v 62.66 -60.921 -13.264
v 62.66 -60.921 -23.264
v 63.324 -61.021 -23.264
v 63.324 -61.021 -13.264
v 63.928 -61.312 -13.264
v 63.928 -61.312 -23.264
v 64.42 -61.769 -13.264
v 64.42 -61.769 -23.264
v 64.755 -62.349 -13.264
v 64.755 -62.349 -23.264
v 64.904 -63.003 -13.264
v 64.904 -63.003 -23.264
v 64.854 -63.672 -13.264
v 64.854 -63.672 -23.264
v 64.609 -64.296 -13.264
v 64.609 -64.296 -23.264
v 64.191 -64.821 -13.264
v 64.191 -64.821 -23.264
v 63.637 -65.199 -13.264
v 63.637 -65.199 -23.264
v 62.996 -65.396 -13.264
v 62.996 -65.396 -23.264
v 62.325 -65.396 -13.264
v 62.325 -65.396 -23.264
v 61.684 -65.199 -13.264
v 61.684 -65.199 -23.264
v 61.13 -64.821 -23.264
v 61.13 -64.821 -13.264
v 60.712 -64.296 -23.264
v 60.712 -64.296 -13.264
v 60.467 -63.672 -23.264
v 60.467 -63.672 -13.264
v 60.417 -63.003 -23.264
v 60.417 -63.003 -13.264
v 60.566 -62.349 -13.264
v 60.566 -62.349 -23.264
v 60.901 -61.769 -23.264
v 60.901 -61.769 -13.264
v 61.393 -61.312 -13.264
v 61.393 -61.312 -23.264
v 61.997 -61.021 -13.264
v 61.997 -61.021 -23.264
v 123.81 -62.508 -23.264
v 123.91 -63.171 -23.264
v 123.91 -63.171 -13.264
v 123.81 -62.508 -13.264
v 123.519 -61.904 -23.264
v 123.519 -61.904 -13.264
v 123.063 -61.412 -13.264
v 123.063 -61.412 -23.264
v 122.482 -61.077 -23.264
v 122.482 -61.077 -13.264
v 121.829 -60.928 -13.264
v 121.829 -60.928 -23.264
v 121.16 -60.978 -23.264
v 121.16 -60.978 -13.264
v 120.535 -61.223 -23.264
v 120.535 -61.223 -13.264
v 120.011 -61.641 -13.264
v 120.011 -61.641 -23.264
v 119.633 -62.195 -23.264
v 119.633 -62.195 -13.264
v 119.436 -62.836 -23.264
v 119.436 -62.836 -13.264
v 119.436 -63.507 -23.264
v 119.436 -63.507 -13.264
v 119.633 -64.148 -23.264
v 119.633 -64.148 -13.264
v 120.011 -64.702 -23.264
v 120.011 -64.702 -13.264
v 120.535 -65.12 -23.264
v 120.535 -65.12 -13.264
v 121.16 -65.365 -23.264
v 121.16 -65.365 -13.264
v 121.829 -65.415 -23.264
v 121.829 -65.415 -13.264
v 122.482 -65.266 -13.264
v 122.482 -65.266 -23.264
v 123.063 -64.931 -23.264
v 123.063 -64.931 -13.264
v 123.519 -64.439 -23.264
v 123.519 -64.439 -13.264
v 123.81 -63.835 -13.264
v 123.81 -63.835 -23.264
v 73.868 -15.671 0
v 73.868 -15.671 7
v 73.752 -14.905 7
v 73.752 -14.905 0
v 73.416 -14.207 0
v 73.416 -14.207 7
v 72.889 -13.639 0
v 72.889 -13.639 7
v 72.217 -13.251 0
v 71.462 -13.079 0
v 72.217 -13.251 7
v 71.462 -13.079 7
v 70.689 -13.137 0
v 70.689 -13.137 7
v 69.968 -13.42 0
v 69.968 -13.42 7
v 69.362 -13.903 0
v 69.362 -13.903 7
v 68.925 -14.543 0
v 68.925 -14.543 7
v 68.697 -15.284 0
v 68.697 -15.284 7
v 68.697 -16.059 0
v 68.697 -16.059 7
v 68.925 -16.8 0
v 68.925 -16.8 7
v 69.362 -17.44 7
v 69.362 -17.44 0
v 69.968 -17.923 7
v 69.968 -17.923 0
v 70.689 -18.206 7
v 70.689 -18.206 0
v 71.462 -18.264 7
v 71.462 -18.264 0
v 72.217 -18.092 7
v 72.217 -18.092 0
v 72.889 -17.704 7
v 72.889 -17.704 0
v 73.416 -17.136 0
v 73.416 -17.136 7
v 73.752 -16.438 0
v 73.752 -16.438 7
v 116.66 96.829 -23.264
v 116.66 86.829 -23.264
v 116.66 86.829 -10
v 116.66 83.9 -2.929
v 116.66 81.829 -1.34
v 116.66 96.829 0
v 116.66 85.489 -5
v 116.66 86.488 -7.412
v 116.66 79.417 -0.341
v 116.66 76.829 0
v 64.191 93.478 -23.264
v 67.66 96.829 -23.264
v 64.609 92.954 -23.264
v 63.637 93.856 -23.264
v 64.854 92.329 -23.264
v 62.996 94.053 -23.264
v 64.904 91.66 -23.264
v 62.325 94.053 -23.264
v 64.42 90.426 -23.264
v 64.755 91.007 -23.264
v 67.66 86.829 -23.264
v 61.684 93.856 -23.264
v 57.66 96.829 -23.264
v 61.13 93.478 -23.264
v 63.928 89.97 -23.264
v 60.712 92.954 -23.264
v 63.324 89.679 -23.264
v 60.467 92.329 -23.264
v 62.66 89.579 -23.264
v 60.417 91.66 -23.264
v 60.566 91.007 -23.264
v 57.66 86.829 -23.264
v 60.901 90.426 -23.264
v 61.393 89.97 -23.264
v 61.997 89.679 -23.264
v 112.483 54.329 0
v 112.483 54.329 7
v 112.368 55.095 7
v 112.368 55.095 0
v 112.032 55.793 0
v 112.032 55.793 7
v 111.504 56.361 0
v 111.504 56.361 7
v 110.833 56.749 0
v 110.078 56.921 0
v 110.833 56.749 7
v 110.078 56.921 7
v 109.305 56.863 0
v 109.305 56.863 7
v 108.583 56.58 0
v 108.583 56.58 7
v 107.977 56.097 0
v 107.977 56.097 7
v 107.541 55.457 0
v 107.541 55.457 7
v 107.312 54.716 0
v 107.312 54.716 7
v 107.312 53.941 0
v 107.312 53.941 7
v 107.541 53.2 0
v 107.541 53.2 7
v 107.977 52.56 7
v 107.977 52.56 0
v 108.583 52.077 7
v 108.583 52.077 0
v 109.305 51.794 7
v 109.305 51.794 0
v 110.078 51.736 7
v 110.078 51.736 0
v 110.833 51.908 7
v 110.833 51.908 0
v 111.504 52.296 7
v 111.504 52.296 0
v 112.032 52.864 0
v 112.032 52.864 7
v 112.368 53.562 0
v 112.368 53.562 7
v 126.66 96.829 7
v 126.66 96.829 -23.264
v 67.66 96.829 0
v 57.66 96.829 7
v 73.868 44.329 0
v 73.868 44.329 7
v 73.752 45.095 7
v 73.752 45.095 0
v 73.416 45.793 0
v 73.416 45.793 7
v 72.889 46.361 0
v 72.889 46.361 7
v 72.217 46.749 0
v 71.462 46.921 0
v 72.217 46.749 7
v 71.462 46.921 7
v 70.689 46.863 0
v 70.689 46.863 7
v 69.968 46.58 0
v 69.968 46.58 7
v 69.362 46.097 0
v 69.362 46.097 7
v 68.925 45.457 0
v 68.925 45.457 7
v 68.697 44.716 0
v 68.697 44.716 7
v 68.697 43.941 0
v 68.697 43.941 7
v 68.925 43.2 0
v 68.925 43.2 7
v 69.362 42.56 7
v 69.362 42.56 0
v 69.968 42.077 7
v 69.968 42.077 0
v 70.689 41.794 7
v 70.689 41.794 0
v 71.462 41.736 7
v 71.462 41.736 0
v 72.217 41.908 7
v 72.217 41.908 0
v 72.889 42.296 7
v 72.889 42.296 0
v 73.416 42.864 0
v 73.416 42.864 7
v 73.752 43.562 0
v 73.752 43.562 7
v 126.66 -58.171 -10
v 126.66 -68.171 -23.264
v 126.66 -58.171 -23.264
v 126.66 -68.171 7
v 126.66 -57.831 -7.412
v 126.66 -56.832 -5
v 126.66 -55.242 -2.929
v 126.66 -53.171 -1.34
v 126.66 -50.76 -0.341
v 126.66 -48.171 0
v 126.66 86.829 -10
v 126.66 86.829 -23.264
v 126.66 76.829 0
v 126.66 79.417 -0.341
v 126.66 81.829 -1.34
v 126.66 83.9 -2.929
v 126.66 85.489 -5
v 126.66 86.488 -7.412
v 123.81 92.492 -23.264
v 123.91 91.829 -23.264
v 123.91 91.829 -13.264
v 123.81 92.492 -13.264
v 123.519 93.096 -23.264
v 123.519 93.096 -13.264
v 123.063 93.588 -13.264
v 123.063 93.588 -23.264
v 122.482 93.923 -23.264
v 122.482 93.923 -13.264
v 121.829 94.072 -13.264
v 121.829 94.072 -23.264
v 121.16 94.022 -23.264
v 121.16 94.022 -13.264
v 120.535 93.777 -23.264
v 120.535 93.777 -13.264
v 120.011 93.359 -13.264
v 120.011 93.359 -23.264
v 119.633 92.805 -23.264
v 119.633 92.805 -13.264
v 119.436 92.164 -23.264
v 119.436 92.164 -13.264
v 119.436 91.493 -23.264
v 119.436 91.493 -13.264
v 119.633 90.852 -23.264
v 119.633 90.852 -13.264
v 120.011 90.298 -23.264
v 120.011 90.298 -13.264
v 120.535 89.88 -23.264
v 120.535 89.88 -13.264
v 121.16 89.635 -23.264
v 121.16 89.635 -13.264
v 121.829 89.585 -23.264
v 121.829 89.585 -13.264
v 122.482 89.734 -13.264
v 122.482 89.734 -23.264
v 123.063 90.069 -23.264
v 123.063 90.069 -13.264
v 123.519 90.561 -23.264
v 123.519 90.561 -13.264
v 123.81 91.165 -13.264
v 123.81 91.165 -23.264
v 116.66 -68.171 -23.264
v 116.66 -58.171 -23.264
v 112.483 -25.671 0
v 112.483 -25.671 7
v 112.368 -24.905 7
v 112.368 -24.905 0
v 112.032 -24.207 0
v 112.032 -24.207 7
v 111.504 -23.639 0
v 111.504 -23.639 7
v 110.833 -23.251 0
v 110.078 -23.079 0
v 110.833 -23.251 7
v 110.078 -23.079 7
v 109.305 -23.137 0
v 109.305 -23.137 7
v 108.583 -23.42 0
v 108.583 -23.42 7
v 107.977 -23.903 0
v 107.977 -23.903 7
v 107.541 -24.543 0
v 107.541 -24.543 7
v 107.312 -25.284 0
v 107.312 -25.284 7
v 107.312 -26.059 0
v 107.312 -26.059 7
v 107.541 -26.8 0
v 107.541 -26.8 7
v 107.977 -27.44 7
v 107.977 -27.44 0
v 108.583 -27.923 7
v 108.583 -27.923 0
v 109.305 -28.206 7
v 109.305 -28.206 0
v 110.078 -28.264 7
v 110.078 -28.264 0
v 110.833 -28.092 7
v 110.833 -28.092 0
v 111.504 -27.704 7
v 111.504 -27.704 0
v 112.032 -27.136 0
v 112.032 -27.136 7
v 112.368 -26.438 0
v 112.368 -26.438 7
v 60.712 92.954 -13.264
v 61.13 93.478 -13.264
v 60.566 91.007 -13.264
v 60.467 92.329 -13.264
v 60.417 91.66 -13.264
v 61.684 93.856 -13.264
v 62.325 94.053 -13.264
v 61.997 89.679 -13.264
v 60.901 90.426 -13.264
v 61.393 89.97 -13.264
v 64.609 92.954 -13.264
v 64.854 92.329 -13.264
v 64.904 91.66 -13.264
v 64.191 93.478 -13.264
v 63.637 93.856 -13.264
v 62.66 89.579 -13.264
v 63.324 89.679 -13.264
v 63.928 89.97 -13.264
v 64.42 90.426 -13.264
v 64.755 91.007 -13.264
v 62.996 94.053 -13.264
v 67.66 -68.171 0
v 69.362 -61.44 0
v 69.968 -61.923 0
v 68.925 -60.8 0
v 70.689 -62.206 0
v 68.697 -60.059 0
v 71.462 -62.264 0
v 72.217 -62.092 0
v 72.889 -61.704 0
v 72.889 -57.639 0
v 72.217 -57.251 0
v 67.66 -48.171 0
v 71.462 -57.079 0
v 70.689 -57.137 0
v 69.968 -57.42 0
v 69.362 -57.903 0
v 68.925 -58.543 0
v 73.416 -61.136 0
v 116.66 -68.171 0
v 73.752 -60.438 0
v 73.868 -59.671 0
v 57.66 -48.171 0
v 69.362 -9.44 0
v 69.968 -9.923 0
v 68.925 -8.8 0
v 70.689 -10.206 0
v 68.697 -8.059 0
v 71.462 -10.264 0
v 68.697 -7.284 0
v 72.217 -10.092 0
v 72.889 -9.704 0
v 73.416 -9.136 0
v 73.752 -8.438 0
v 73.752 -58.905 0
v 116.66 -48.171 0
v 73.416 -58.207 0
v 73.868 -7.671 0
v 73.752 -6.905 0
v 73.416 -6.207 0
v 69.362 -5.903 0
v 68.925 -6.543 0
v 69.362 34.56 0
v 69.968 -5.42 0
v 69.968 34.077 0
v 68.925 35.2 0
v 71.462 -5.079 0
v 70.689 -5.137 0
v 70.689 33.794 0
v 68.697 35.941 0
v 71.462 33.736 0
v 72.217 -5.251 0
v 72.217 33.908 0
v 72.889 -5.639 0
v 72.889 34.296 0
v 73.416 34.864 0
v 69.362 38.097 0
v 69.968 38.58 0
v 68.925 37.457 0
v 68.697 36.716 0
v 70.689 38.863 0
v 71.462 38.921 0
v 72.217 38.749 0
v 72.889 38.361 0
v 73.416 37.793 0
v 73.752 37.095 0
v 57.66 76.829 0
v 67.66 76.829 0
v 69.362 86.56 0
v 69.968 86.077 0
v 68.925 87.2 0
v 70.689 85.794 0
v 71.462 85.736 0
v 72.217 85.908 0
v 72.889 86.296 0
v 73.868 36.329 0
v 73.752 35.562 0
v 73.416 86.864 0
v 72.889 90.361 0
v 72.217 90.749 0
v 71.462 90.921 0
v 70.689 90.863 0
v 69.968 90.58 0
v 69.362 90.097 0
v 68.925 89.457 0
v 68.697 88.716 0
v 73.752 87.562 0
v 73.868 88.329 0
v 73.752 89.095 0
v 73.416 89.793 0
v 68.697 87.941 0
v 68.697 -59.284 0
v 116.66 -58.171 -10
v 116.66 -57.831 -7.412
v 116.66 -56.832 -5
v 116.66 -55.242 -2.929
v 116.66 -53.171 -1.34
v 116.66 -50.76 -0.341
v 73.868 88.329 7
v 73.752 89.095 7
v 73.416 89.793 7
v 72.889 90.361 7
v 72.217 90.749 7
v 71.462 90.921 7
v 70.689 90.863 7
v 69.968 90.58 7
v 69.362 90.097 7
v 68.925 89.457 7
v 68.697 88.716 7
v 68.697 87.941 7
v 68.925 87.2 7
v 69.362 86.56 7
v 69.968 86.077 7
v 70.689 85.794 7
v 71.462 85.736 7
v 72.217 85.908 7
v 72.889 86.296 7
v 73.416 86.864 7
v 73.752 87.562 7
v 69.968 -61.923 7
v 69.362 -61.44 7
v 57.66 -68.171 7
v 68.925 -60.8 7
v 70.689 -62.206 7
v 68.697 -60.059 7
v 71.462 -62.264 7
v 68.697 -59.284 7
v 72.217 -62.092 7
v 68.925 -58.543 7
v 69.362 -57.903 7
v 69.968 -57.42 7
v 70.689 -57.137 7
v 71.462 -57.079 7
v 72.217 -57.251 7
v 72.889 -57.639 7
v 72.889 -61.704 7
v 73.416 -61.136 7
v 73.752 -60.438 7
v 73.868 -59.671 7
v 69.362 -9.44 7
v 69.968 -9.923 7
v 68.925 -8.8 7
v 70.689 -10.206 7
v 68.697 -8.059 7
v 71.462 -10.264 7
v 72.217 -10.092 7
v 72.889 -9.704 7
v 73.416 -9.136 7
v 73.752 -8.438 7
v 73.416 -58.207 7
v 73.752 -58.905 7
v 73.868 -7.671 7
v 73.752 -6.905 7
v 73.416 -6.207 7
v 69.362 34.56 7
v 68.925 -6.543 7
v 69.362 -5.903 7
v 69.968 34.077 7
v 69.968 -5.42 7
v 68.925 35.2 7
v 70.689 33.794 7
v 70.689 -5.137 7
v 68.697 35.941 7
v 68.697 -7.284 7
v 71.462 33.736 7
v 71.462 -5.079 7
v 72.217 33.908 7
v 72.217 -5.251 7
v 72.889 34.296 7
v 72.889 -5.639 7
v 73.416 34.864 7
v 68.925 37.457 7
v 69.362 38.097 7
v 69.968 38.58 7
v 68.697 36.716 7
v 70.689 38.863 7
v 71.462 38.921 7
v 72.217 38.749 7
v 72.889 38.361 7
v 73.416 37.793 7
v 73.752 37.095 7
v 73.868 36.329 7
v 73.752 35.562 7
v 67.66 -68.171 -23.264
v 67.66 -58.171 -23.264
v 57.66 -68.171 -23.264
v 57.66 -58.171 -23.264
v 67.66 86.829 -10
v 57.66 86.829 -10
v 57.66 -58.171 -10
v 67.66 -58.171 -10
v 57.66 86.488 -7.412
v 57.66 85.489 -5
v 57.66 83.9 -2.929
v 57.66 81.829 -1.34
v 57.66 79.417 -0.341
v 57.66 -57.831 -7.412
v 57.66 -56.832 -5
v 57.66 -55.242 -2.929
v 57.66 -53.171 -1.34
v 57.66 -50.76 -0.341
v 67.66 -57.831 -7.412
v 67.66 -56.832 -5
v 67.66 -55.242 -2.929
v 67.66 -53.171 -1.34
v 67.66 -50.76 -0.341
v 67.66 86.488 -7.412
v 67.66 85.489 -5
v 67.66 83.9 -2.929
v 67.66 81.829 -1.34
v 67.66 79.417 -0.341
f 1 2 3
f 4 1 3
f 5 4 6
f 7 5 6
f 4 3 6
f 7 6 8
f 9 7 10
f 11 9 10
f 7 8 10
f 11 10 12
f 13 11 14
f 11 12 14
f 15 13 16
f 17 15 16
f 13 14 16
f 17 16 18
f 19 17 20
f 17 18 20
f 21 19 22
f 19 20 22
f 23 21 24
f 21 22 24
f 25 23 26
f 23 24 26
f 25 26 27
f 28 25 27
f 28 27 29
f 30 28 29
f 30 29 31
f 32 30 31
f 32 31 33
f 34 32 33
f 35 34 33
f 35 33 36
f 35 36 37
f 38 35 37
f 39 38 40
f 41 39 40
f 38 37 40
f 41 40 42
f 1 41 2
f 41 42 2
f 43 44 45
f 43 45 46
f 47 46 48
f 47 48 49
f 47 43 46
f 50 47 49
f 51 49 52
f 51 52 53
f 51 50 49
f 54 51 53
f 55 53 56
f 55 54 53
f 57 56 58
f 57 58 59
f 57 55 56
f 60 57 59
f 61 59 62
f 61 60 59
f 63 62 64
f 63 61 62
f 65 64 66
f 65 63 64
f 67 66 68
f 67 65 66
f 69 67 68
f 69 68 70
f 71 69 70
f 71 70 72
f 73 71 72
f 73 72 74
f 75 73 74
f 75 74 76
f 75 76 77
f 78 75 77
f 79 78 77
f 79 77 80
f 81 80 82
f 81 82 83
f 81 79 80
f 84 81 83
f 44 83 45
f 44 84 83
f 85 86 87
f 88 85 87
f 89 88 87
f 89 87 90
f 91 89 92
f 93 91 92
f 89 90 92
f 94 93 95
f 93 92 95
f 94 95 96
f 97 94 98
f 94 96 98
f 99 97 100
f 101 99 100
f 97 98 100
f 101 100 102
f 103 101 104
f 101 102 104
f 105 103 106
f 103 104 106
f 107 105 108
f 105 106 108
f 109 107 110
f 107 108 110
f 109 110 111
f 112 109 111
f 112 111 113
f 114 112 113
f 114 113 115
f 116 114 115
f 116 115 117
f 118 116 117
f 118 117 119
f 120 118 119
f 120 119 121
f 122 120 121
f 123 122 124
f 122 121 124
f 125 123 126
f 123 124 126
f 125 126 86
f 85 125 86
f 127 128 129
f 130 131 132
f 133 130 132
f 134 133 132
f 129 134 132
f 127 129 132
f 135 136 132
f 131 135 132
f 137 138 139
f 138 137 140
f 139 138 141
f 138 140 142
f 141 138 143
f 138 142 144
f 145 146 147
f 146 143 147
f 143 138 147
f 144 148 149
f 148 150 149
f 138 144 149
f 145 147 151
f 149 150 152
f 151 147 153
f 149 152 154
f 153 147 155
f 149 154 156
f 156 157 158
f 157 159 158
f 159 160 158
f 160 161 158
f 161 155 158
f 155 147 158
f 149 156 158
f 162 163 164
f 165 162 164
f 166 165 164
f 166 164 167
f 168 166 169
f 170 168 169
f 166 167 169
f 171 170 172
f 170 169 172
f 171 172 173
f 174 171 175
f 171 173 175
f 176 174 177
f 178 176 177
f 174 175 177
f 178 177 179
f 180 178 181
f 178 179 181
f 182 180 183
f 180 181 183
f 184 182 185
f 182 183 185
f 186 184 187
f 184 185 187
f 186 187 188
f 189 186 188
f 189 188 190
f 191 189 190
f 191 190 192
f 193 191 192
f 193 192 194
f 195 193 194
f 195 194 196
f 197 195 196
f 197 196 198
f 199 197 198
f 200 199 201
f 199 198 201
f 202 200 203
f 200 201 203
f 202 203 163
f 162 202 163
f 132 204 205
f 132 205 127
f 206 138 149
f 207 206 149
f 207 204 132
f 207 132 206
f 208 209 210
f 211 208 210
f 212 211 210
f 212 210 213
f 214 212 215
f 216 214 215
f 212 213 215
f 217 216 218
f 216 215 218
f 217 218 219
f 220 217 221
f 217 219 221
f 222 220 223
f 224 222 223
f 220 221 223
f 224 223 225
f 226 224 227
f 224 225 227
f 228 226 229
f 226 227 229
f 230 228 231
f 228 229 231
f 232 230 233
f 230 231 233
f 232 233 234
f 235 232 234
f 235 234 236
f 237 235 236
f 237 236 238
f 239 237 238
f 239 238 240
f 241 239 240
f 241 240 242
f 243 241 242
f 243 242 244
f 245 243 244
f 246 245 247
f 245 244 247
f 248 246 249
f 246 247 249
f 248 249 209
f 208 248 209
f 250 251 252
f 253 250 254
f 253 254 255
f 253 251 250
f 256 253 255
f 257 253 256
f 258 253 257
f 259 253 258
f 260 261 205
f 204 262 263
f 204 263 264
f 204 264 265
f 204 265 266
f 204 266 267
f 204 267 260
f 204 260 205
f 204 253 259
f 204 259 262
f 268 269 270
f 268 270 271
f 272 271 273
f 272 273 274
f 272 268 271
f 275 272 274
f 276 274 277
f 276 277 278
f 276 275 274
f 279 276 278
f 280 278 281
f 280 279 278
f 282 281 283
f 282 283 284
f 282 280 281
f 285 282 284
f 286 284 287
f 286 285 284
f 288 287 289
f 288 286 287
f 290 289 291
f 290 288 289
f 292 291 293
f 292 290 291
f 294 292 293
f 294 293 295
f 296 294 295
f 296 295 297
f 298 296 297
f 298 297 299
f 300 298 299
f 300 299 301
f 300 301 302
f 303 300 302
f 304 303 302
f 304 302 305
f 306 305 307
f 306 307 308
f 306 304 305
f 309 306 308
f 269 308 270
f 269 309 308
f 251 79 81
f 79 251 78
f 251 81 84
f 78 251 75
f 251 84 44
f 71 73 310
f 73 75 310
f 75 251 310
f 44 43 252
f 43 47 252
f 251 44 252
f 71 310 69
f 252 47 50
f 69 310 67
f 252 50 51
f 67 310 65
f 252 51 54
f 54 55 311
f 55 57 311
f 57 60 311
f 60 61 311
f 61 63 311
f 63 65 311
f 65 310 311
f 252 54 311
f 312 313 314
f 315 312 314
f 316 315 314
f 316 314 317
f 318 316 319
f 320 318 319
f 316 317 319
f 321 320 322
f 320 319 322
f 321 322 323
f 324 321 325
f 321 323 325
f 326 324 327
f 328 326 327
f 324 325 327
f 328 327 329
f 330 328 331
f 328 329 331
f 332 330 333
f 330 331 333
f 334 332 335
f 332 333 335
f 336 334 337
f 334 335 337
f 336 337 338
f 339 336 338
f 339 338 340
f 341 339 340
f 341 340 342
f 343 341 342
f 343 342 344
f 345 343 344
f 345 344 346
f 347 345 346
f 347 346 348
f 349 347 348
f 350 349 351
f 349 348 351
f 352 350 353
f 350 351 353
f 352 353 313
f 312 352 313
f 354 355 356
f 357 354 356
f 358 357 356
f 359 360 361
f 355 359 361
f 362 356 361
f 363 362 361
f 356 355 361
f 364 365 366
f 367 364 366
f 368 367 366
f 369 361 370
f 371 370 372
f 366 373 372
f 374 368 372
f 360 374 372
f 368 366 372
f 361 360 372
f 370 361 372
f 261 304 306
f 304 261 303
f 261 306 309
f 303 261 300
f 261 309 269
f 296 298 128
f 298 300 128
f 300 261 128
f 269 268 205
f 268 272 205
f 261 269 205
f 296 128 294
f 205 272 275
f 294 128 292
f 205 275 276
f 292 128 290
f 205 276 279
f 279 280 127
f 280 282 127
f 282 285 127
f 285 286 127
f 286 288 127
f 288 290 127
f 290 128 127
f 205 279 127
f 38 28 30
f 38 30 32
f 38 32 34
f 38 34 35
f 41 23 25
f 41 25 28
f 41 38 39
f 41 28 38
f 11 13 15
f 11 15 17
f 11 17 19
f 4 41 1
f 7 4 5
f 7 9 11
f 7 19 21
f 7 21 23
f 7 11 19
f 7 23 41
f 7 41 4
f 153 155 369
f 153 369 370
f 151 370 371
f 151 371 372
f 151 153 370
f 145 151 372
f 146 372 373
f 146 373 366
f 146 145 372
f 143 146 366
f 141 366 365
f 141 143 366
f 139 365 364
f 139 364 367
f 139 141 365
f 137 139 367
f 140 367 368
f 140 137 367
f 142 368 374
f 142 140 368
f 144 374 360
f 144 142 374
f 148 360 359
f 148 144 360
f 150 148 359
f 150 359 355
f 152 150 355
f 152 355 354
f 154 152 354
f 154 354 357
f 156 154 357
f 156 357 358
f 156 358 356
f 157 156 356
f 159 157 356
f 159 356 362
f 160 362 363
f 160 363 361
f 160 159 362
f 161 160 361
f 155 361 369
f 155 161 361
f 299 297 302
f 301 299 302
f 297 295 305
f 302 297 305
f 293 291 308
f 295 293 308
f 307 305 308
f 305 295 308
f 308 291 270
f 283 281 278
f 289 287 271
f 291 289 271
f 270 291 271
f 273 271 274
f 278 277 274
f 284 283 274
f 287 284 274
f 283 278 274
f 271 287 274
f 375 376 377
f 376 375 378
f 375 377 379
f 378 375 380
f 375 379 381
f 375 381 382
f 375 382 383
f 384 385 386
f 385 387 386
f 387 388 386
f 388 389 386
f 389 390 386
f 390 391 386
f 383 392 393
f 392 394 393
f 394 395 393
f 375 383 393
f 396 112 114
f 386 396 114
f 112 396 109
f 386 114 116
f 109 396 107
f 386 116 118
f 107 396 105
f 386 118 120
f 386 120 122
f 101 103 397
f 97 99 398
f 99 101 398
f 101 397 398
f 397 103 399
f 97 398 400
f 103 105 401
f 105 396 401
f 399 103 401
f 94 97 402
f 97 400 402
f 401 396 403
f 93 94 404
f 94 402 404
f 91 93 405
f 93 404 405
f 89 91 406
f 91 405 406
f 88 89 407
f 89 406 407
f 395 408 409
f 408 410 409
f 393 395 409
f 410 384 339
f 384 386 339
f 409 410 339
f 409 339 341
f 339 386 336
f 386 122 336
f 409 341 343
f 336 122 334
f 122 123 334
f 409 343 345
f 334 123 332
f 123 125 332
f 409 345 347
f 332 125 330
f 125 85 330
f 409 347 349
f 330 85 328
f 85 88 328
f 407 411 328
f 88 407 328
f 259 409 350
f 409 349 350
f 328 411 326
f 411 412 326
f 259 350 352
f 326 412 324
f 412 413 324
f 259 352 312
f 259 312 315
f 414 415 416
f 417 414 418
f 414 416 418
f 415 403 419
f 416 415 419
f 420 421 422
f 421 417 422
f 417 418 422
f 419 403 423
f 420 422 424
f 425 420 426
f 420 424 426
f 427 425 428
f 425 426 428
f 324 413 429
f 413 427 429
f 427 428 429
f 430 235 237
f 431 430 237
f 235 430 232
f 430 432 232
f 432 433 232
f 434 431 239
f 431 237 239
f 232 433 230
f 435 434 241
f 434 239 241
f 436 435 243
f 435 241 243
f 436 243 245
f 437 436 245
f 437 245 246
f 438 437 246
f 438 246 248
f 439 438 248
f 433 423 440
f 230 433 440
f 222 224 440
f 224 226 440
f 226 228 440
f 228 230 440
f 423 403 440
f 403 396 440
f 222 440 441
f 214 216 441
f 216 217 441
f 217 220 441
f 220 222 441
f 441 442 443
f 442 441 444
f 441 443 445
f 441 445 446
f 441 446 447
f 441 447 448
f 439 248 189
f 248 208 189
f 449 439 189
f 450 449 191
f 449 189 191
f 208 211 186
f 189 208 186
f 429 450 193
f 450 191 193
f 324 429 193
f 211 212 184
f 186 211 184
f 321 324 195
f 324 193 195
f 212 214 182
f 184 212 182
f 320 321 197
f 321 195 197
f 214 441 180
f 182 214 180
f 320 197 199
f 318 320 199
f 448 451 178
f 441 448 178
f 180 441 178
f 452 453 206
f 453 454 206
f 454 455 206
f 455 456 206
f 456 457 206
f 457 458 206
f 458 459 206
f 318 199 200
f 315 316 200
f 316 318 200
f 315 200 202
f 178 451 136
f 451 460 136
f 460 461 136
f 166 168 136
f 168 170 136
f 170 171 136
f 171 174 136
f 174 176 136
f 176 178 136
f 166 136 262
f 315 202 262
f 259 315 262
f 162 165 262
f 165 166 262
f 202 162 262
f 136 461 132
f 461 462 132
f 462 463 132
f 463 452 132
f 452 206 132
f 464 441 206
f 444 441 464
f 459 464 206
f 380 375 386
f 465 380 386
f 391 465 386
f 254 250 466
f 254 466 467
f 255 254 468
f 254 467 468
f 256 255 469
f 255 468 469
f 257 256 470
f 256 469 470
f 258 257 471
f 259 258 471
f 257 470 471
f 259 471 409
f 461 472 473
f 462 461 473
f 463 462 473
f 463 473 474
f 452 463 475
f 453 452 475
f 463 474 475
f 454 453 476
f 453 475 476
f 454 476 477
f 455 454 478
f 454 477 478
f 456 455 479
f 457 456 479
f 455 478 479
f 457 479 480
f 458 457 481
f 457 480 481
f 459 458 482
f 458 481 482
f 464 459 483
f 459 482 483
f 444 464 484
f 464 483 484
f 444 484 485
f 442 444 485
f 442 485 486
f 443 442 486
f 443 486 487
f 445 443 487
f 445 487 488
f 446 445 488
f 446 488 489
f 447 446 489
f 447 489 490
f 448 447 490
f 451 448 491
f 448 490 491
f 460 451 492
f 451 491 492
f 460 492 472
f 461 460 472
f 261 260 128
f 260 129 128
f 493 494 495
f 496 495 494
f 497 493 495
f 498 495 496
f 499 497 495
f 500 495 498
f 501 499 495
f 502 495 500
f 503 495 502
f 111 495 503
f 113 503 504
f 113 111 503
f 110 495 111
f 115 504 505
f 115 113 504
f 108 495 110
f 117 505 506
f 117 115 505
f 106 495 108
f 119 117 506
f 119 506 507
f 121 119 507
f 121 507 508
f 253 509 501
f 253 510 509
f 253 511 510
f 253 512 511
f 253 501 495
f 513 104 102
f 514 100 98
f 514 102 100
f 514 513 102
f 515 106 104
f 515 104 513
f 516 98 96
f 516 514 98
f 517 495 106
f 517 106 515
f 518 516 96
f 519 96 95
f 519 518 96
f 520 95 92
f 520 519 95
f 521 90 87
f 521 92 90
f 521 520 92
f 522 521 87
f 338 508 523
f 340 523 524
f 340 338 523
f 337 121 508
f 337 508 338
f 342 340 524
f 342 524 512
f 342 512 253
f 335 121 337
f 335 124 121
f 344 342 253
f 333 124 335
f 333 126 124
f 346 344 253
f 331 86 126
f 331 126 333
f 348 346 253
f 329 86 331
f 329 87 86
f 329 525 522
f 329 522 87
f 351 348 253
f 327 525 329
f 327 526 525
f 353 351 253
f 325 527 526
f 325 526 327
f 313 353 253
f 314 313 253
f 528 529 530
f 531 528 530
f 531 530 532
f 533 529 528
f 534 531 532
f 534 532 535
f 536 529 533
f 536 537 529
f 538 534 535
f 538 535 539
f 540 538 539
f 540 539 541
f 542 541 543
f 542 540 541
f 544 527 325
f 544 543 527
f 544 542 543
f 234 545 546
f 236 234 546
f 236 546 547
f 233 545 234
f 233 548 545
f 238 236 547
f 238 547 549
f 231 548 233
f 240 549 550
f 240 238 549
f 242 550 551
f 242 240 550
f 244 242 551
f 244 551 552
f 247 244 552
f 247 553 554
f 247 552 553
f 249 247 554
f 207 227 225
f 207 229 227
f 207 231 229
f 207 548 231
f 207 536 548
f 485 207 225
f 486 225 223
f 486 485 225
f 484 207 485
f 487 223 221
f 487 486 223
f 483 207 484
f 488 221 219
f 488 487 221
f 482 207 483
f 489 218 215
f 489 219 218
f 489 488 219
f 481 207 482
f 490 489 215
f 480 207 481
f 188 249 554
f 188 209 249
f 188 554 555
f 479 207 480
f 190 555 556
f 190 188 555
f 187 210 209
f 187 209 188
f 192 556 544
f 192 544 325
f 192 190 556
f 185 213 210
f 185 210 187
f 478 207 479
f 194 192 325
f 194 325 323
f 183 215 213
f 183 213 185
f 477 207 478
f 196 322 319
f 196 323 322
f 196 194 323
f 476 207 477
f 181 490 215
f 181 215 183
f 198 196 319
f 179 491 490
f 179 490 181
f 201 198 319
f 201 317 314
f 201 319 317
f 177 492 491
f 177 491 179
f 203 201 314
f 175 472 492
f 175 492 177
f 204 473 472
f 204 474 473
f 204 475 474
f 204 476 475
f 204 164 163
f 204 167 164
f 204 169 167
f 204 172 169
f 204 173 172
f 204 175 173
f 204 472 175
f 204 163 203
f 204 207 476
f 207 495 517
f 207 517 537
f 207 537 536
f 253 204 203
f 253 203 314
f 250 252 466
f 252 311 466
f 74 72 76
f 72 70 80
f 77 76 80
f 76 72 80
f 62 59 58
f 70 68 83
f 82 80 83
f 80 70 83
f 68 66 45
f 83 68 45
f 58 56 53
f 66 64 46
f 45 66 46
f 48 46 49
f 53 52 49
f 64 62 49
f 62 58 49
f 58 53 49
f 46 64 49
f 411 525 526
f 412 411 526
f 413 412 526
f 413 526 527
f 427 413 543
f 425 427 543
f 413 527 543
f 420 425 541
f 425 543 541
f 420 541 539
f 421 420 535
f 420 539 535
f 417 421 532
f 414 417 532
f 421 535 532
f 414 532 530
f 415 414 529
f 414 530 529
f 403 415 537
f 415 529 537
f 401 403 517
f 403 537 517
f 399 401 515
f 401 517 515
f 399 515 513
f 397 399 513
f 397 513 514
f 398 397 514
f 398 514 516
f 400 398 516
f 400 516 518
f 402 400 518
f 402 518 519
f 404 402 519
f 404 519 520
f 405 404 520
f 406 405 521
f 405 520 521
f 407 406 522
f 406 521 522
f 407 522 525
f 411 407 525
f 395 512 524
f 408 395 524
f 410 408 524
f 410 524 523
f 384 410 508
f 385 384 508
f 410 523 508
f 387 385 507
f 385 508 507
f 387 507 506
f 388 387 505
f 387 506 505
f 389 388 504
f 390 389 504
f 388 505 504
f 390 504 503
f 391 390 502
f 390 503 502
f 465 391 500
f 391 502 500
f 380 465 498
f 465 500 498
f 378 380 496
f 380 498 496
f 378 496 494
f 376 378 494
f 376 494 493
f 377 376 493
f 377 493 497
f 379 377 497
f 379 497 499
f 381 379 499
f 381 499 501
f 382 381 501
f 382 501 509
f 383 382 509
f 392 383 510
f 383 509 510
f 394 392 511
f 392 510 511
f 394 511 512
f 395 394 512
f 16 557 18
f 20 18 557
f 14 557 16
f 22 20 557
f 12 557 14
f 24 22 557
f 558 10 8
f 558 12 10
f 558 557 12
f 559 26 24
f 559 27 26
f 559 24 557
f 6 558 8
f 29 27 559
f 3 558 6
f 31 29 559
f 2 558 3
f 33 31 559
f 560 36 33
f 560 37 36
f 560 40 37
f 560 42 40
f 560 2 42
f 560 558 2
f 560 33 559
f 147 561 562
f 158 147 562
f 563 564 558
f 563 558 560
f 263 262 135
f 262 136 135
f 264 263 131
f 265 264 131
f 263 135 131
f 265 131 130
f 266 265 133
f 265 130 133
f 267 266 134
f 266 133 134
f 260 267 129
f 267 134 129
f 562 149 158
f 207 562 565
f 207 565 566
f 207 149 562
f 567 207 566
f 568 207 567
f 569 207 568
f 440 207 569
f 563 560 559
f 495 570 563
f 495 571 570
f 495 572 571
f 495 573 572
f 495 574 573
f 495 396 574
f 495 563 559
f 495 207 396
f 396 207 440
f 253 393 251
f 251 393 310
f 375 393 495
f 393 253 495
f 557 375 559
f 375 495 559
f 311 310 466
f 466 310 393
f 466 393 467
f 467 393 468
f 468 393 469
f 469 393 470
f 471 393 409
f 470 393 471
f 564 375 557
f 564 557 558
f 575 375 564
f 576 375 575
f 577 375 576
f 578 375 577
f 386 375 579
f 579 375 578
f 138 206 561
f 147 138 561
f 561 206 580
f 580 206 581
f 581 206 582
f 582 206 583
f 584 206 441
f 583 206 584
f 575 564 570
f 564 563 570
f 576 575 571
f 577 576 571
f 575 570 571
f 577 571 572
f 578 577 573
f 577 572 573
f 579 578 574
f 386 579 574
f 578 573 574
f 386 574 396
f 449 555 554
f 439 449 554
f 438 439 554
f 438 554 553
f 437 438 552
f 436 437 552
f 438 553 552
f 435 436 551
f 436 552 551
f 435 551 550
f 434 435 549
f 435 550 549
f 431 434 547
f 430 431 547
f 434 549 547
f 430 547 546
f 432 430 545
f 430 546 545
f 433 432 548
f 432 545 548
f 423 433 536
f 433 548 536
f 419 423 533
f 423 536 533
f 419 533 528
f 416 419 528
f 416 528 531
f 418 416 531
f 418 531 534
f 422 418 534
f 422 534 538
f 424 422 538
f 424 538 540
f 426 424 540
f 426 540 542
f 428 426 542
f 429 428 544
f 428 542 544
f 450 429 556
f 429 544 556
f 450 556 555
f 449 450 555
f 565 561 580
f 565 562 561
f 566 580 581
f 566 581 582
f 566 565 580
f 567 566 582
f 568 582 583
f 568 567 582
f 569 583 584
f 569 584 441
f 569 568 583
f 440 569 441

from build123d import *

# Parameters (mm, degrees)
SKETCH1_W            = 69
SKETCH1_H            = 165
BOSS_EXTRUDE1_DEPTH  = 7
SKETCH3_R            = 2.6
CUT_EXTRUDE2_DEPTH   = 7
SKETCH2_R            = 2.6
CUT_EXTRUDE1_DEPTH   = 7
SKETCH5_W            = 10
SKETCH5_H            = 10
BOSS_EXTRUDE2_DEPTH  = 23.264128691
SKETCH6_R            = 2.25
CUT_EXTRUDE3_DEPTH   = 10
FILLET1_R            = 10
FILLET1_OF_MIRROR1_R = 10
MIRROR2_START        = 123.910418582
MIRROR2_DEPTH        = 2.75
MIRROR2_START_2      = 116.660418582
MIRROR2_2_DEPTH      = 2.7499999
MIRROR2_START_3      = 119.410418482
MIRROR2_3_DEPTH      = 4.5000001
MIRROR2_START_4      = -23.264128691
MIRROR2_4_OUTLINE_R  = 2.25
MIRROR2_4_DEPTH      = 10


with BuildPart() as part:
    # Sketch1 → Boss-Extrude1 (new body)
    with BuildSketch(Plane.XY):
        with Locations((92.160418582, 14.328579343)):
            Rectangle(SKETCH1_W, SKETCH1_H)
    extrude(amount=BOSS_EXTRUDE1_DEPTH)

    # Sketch3 → Cut-Extrude2 (cut)
    with BuildSketch(Plane.XY.offset(7)):
        with Locations((109.883329943, 54.328579343)):
            Circle(SKETCH3_R)
        with Locations((109.883329943, -25.671420657)):
            Circle(SKETCH3_R)
    extrude(amount=-CUT_EXTRUDE2_DEPTH, mode=Mode.SUBTRACT)

    # Sketch2 → Cut-Extrude1 (cut)
    with BuildSketch(Plane.XY.offset(7)):
        with Locations((71.267526747, -59.671420657)):
            Circle(SKETCH2_R)
        with Locations((71.267526747, -15.671420657)):
            Circle(SKETCH2_R)
        with Locations((71.267526747, -7.671420657)):
            Circle(SKETCH2_R)
        with Locations((71.267526747, 36.328579343)):
            Circle(SKETCH2_R)
        with Locations((71.267526747, 44.328579343)):
            Circle(SKETCH2_R)
        with Locations((71.267526747, 88.328579343)):
            Circle(SKETCH2_R)
    extrude(amount=-CUT_EXTRUDE1_DEPTH, mode=Mode.SUBTRACT)

    # Sketch5 → Boss-Extrude2 (add)
    with BuildSketch(Plane(origin=(0, 0, 0), x_dir=(-1, 0, 0), z_dir=(0, 0, -1))):
        with Locations((-62.660418582, -63.171420657)):
            Rectangle(SKETCH5_W, SKETCH5_H)
    boss_extrude2 = extrude(amount=BOSS_EXTRUDE2_DEPTH)

    # Sketch6 → Cut-Extrude3 (cut)
    with BuildSketch(Plane(origin=(0, 0, -23.264128691), x_dir=(-1, 0, 0), z_dir=(0, 0, -1))):
        with Locations(Location((-62.660418582, -63.171420657, 0), (0, 0, 90))):
            Circle(SKETCH6_R)
    cut_extrude3 = extrude(amount=-CUT_EXTRUDE3_DEPTH, mode=Mode.SUBTRACT)

    # Fillet1
    fillet1_edges = [part.edges().sort_by_distance(p)[0] for p in [
        (62.660418582, -58.171420657, 0),
    ]]
    fillet(fillet1_edges, radius=FILLET1_R)

    # Mirror1: Boss-Extrude2, Cut-Extrude3 across plane
    add(boss_extrude2.mirror(Plane(origin=(0, 14.328579343, 0), x_dir=(0, 0, 1), z_dir=(0, -1, 0))))
    add(cut_extrude3.mirror(Plane(origin=(0, 14.328579343, 0), x_dir=(0, 0, 1), z_dir=(0, -1, 0))), mode=Mode.SUBTRACT)

    # Fillet1 of Mirror1
    fillet1_of_mirror1_edges = [part.edges().sort_by_distance(p)[0] for p in [
        (62.660418582, 86.828579343, 0),
    ]]
    fillet(fillet1_of_mirror1_edges, radius=FILLET1_OF_MIRROR1_R)

    # Mirror2: read off the stored shape, not the designer's step
    # Mirror2 outline → Mirror2 (add)
    with BuildSketch(Plane.YZ.offset(MIRROR2_START)):
        with BuildLine():
            ThreePointArc((-58.171420657, -10), (-55.242488469, -2.928932188), (-48.171420657, 0))
            Line((-48.171420657, 0), (-68.171420657, 0))
            Line((-68.171420657, 0), (-68.171420657, -23.264128691))
            Line((-68.171420657, -23.264128691), (-58.171420657, -23.264128691))
            Line((-58.171420657, -23.264128691), (-58.171420657, -10))
        make_face()
        with BuildLine():
            Line((96.828579343, -23.264128691), (96.828579343, 0))
            Line((96.828579343, 0), (76.828579343, 0))
            ThreePointArc((76.828579343, 0), (83.899647155, -2.928932188), (86.828579343, -10))
            Line((86.828579343, -10), (86.828579343, -23.264128691))
            Line((86.828579343, -23.264128691), (96.828579343, -23.264128691))
        make_face()
    extrude(amount=MIRROR2_DEPTH)

    # Mirror2 2 outline → Mirror2 2 (add)
    with BuildSketch(Plane.YZ.offset(MIRROR2_START_2)):
        with BuildLine():
            ThreePointArc((-58.171420657, -10), (-55.242488469, -2.928932188), (-48.171420657, 0))
            Line((-48.171420657, 0), (-68.171420657, 0))
            Line((-68.171420657, 0), (-68.171420657, -23.264128691))
            Line((-68.171420657, -23.264128691), (-58.171420657, -23.264128691))
            Line((-58.171420657, -23.264128691), (-58.171420657, -10))
        make_face()
        with BuildLine():
            Line((96.828579343, -23.264128691), (96.828579343, 0))
            Line((96.828579343, 0), (76.828579343, 0))
            ThreePointArc((76.828579343, 0), (83.899647155, -2.928932188), (86.828579343, -10))
            Line((86.828579343, -10), (86.828579343, -23.264128691))
            Line((86.828579343, -23.264128691), (96.828579343, -23.264128691))
        make_face()
    extrude(amount=MIRROR2_2_DEPTH)

    # Mirror2 3 outline → Mirror2 3 (add)
    with BuildSketch(Plane.YZ.offset(MIRROR2_START_3)):
        with BuildLine():
            Line((-68.171420657, -23.264128691), (-58.171420657, -23.264128691))
            Line((-58.171420657, -23.264128691), (-58.171420657, -10))
            ThreePointArc((-58.171420657, -10), (-55.242488469, -2.928932188), (-48.171420657, 0))
            Line((-48.171420657, 0), (-68.171420657, 0))
            Line((-68.171420657, 0), (-68.171420657, -23.264128691))
        make_face()
        with BuildLine():
            Line((96.828579343, 0), (76.828579343, 0))
            ThreePointArc((76.828579343, 0), (83.899647155, -2.928932188), (86.828579343, -10))
            Line((86.828579343, -10), (86.828579343, -23.264128691))
            Line((86.828579343, -23.264128691), (96.828579343, -23.264128691))
            Line((96.828579343, -23.264128691), (96.828579343, 0))
        make_face()
    extrude(amount=MIRROR2_3_DEPTH)

    # Mirror2 4 outline → Mirror2 4 (cut)
    with BuildSketch(Plane.XY.offset(MIRROR2_START_4)):
        with Locations((121.660418582, -63.171420657)):
            Circle(MIRROR2_4_OUTLINE_R)
        with Locations((121.660418582, 91.828579343)):
            Circle(MIRROR2_4_OUTLINE_R)
    extrude(amount=MIRROR2_4_DEPTH, mode=Mode.SUBTRACT)


solid = part.part
